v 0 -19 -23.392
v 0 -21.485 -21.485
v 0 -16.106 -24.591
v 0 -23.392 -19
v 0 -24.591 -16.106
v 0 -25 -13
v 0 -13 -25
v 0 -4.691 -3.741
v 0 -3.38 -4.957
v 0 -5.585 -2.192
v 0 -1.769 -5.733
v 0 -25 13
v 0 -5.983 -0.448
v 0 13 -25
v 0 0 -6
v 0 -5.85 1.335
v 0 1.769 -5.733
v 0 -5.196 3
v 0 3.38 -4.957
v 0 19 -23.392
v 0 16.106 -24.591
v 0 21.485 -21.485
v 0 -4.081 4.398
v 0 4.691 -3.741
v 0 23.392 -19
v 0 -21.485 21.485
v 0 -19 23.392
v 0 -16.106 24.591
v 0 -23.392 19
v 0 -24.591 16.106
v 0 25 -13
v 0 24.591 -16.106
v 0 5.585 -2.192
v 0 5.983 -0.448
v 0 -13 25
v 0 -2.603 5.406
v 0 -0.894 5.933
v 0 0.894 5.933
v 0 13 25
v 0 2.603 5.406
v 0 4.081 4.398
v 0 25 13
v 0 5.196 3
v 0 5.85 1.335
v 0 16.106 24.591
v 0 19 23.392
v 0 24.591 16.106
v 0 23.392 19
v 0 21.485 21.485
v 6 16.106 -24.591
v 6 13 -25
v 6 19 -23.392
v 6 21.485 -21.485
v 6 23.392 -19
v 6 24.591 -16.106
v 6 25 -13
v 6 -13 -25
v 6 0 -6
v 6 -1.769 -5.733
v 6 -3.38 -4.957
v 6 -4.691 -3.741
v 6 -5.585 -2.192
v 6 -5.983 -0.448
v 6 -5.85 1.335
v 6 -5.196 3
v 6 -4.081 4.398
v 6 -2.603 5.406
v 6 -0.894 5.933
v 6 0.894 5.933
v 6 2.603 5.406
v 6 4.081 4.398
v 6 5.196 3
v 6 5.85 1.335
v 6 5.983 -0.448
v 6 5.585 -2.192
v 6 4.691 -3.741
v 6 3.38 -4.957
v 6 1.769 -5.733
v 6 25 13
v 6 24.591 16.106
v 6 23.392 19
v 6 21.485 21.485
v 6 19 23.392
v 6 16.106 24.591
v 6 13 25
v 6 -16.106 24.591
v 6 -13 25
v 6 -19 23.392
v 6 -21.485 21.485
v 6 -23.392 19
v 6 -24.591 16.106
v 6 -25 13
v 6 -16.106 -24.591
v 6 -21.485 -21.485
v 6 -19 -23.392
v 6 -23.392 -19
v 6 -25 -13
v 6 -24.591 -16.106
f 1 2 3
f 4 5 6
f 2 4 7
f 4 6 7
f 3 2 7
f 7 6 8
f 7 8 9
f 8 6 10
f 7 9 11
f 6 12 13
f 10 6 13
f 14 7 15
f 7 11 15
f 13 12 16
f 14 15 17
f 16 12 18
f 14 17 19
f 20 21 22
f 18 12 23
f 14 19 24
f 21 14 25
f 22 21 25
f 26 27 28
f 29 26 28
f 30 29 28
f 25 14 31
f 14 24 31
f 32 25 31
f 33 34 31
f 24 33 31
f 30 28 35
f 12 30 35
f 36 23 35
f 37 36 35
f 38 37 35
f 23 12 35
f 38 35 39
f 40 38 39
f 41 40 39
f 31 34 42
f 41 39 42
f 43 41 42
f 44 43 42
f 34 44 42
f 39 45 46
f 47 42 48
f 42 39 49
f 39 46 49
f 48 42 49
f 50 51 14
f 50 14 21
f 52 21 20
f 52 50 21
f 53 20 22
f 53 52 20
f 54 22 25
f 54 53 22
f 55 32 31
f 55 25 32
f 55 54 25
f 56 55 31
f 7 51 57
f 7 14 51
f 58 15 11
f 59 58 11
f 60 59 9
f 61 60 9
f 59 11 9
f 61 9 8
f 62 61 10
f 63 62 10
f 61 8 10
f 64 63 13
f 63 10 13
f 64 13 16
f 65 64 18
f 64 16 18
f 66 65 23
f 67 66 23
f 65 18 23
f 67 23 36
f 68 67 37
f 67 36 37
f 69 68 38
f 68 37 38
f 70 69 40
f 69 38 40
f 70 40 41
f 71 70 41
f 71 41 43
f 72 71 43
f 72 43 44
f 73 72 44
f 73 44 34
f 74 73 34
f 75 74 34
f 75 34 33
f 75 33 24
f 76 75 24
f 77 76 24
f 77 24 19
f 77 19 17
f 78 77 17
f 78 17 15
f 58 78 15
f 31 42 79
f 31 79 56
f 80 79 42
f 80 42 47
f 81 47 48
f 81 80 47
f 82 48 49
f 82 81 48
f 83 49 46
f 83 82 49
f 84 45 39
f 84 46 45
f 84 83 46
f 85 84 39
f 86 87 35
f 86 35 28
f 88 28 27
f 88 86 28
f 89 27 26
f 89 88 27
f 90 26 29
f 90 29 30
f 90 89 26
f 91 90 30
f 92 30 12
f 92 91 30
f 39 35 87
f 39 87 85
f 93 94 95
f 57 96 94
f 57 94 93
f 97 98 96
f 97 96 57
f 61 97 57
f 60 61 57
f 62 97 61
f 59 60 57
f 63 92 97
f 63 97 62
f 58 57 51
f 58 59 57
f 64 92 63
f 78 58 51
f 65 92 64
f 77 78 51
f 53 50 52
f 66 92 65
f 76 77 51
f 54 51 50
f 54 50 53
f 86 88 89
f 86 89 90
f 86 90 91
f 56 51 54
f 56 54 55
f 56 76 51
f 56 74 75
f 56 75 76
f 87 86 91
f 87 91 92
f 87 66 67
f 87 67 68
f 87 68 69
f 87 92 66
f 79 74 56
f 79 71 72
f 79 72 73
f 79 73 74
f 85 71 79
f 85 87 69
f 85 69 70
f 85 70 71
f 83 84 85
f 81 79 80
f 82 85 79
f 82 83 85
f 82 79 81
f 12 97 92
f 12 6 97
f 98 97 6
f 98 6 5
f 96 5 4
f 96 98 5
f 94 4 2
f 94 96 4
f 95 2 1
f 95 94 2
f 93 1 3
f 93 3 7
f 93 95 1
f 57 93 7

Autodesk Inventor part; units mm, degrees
ref_plane "YZ Plane" through (0, 0, 0) normal (1, 0, 0) x (0, 1, 0)
ref_plane "XZ Plane" through (0, 0, 0) normal (0, 1, 0) x (-1, 0, 0)
ref_plane "XY Plane" through (0, 0, 0) normal (0, 0, 1) x (1, 0, 0)
sketch "Sketch1" plane through (0, 0, 0) normal (1, 0, 0) x (0, 1, 0)
  line L0 (-25, 25) -> (25, 25)
  line L1 (25, 25) -> (25, -25)
  line L2 (25, -25) -> (-25, -25)
  line L3 (-25, -25) -> (-25, 25)
  point P0 (0, 0)
  dimension "d0" = 50
  dimension "d1" = 50
  dimension "d2" = 25
  dimension "d3" = 25
extrude "Extrusion1" add sketch "Sketch1" along normal blind 6
sketch "Sketch2" plane through (6, 0, 0) normal (1, 0, 0) x (0, 0, -1)
  point P0 (0, 0)
  point P1 (0, 0)
hole "Hole1" at (6, 0, 0) direction (-1, 0, 0) diameter 12 end through all
fillet "Fillet2" radius 12 4 edges at (3, 25, 25) (3, 25, -25) (3, -25, -25) (3, -25, 25)
equation "\"d0\" = hoop_tabs_width"
equation "\"d1\" = hoop_tabs_width"
equation "\"d2\" = 0.5 * d1"
equation "\"d3\" = 0.5 * d0"
equation "\"d4\" = hoop_tabs_thickness"
equation "\"d6\" = hoop_tabs_hole"
equation "\"d14\" = hoop_tabs_hole"
equation "\"hoop_tabs_width\" = 50"
equation "\"hoop_tabs_thickness\" = 6"
equation "\"hoop_tabs_hole\" = 12"
equation "\"hoop_angle_z\" = 45deg"
equation "\"hoop_bearing_length\" = 5deg"
equation "\"hoop_cable_diam\" = 5"
equation "\"hoop_cable_pulley_diam\" = 22"
equation "\"hoop_thickness_large\" = 4"
equation "\"hoop_thickness_medium\" = 3.2"
equation "\"hoop_thickness_small\" = 2"
equation "\"hoop_width_large\" = 51"
equation "\"hoop_width_medium\" = 33.7"
equation "\"hoop_width_small\" = 25.4"
equation "\"rack_tooth_addendum\" = 5"
equation "\"rack_tooth_dedendum\" = 5"
equation "\"rack_tooth_thickness\" = 5"
equation "\"secure_arm_angle\" = 35deg"
equation "\"secure_arm_radii\" = 9"
equation "\"support_baseClamp_platformLengthBuffer\" = 35"
equation "\"support_baseClamp_platformThickness\" = 15"
equation "\"support_baseClamp_platformWidthBuffer\" = 0"
equation "\"support_baseClamp_sleeveHoleDiameter\" = 12"
equation "\"support_baseClamp_sleeveSweepTerminationAngle\" = 55deg"
equation "\"support_baseClamp_thickness\" = 8"
equation "\"support_frame_endHoleBuffer\" = 45"
equation "\"support_frame_squareBarFillet\" = 2"
equation "\"support_frame_squareBarThickness\" = 5"
equation "\"wheelchair_deployed_width\" = 635"
equation "\"wheelchair_deployed_length\" = 1067"
equation "\"wheelchair_deployed_height\" = 914"
equation "\"sm_varx_squareBarThickness\" = 2.5"
equation "\"sm_varx_pinPlate_thickness\" = 5"
equation "\"sm_varx_pinPlate_holeDiameter\" = 5"
equation "\"sm_varx_member_tolerance\" = 0"
equation "\"hoop_bushing12_radialInterference\" = 0"
equation "\"hoop_bushing23_radialInterference\" = 0"
equation "\"hoop_bushing23_od\" = -2 * hoop_thickness_medium + hoop_width_medium + hoop_bushing23_radialInterference"
equation "\"hoop_bushing12_od\" = -2 * hoop_thickness_large + hoop_width_large + hoop_bushing12_radialInterference"
equation "\"wheelchatir_pos_deploy_angle_0\" = 65deg"
equation "\"wheelchatir_pos_store_angle_0\" = 90deg"
equation "\"wheelchatir_pos_deploy_angle_1\" = 20deg"
equation "\"wheelchatir_pos_store_angle_1\" = 20deg"
equation "\"hoop_bushing12_thickness\" = -hoop_width_medium + hoop_bushing12_od - 2 * hoop_bushing12_radialInterference"
equation "\"hoop_bushing23_thickness\" = -hoop_width_small + hoop_bushing23_od - 2 * hoop_bushing23_radialInterference"
properties part number "hoop_tab" material "Steel, Mild"
